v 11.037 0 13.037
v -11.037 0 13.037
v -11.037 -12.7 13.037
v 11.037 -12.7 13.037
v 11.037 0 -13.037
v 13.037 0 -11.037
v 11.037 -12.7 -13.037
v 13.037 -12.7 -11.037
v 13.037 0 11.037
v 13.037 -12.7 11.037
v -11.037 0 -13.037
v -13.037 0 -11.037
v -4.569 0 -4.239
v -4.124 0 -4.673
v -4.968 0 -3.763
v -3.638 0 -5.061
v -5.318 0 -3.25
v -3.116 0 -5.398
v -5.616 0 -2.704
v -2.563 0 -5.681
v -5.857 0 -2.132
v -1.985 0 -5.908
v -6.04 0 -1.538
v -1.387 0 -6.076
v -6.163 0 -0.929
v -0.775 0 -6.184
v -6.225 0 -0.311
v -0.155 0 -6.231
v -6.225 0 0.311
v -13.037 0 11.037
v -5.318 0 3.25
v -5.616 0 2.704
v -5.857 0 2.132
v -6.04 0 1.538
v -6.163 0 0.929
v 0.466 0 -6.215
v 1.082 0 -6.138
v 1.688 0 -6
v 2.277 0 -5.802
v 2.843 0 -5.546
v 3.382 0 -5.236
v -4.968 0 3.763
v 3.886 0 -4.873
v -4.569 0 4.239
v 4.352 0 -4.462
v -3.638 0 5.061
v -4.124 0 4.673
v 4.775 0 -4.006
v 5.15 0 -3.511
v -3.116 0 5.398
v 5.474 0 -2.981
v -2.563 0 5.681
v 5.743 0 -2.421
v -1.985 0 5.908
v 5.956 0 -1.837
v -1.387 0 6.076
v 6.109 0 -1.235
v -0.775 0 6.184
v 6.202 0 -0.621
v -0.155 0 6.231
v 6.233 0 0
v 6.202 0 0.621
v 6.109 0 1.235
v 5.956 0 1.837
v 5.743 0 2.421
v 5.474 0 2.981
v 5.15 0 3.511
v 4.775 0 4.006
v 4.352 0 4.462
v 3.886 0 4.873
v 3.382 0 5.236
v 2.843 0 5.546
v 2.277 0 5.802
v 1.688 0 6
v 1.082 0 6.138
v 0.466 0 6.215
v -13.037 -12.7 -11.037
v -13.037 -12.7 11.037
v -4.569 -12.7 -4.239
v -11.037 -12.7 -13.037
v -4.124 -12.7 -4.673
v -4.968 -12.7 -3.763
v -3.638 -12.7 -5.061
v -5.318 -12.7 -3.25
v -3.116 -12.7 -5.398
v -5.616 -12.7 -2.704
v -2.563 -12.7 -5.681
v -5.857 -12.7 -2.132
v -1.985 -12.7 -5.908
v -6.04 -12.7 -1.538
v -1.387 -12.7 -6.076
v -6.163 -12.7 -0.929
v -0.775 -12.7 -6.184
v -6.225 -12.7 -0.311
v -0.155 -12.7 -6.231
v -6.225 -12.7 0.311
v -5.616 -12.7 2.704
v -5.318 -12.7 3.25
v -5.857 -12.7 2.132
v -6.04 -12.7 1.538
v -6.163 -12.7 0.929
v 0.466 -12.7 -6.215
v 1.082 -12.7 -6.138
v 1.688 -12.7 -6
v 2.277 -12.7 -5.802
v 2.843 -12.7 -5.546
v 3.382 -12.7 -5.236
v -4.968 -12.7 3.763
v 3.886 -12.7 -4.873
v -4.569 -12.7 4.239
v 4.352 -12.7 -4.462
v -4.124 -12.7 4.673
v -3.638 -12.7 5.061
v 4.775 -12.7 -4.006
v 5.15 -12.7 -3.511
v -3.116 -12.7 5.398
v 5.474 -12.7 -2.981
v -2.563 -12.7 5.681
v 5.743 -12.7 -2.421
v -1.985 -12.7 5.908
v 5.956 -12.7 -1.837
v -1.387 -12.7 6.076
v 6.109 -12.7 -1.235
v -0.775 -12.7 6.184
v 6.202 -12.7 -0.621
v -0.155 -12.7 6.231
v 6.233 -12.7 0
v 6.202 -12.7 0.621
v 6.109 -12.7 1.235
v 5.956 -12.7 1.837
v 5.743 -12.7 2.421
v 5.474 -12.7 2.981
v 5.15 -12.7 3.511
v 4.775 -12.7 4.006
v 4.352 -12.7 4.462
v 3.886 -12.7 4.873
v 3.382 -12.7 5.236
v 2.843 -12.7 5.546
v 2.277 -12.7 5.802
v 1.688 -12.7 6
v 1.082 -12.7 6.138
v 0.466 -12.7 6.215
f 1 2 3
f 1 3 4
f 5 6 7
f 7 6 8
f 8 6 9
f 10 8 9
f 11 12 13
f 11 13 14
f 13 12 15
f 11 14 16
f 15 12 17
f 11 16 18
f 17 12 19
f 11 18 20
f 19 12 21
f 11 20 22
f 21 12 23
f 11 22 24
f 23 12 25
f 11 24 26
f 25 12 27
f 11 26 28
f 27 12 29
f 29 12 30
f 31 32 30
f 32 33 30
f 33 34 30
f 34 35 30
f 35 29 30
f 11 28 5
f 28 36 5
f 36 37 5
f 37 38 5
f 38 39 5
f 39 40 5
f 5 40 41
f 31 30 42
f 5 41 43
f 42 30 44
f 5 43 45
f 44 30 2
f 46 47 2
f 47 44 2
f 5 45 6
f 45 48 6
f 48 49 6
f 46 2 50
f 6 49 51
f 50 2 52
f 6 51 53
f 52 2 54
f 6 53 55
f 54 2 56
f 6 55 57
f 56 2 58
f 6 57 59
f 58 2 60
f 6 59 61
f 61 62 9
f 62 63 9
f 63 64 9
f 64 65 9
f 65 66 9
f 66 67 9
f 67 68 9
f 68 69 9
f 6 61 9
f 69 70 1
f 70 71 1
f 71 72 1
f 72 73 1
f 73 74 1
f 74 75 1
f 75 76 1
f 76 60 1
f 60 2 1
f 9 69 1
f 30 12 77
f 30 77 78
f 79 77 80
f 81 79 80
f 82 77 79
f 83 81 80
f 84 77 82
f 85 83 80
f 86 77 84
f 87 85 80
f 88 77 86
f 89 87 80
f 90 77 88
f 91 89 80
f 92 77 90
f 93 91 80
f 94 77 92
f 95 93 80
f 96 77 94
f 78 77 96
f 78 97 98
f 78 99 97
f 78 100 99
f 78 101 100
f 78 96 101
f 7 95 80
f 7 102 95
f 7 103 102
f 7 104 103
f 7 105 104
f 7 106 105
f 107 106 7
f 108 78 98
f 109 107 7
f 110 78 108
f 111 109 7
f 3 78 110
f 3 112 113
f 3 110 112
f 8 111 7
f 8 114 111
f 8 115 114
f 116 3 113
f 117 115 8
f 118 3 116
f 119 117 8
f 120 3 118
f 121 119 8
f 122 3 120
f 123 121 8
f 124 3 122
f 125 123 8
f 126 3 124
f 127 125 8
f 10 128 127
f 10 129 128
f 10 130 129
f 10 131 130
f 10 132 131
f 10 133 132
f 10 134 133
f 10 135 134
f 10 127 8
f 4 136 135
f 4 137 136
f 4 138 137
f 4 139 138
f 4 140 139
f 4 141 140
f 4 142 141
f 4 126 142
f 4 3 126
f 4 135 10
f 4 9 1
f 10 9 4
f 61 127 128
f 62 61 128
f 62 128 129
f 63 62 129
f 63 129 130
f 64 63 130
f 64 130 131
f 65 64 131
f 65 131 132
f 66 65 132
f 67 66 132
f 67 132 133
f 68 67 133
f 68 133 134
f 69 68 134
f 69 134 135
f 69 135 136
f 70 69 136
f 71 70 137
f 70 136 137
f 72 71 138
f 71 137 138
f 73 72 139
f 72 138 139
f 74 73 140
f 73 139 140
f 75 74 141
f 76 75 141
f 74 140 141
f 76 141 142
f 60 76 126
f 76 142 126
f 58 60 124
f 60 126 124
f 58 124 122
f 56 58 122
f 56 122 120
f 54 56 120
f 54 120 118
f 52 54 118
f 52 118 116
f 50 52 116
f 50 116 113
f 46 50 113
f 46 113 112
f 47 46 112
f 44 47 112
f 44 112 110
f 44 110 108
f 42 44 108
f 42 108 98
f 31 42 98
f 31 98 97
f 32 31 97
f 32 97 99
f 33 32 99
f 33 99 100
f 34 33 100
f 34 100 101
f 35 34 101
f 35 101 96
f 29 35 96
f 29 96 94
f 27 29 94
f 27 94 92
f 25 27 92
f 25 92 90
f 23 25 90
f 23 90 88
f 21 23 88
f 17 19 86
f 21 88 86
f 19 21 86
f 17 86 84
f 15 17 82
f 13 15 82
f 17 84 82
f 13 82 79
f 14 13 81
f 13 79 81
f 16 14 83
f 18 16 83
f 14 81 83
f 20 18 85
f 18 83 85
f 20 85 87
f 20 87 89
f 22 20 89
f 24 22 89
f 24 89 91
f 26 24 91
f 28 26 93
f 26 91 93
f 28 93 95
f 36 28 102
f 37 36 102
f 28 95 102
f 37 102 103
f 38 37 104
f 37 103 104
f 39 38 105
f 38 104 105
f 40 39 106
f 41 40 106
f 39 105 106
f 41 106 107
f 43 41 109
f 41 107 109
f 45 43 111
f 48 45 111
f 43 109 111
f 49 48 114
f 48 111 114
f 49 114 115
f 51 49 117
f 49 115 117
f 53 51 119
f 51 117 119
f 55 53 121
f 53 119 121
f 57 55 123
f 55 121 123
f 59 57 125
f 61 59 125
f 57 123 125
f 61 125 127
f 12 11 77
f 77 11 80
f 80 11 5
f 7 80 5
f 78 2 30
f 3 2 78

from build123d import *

# Parameters (mm, degrees)
F0_W     = 26.0732
F0_H     = 26.0732
F1_DEPTH = 12.7
F2_R     = 6.23275
F3_DEPTH = 12.701
F4_SIZE  = 2


with BuildPart() as f1:
    # F0 (on Front) → F1 (new body)
    with BuildSketch(Plane.XZ):
        Rectangle(F0_W, F0_H)
    extrude(amount=F1_DEPTH)

    # F2 (on face) → F3 (cut, through all)
    with BuildSketch(Plane.XZ.offset(12.7)):
        Circle(F2_R)
    extrude(amount=-F3_DEPTH, mode=Mode.SUBTRACT)

    # F4
    f4_edges = [f1.edges().sort_by_distance(p)[0] for p in [
        (13.0366, -6.35, -13.0366),
        (13.0366, -6.35, 13.0366),
        (-13.0366, -6.35, -13.0366),
        (-13.0366, -6.35, 13.0366),
    ]]
    chamfer(f4_edges, length=F4_SIZE)


solid = f1.part
